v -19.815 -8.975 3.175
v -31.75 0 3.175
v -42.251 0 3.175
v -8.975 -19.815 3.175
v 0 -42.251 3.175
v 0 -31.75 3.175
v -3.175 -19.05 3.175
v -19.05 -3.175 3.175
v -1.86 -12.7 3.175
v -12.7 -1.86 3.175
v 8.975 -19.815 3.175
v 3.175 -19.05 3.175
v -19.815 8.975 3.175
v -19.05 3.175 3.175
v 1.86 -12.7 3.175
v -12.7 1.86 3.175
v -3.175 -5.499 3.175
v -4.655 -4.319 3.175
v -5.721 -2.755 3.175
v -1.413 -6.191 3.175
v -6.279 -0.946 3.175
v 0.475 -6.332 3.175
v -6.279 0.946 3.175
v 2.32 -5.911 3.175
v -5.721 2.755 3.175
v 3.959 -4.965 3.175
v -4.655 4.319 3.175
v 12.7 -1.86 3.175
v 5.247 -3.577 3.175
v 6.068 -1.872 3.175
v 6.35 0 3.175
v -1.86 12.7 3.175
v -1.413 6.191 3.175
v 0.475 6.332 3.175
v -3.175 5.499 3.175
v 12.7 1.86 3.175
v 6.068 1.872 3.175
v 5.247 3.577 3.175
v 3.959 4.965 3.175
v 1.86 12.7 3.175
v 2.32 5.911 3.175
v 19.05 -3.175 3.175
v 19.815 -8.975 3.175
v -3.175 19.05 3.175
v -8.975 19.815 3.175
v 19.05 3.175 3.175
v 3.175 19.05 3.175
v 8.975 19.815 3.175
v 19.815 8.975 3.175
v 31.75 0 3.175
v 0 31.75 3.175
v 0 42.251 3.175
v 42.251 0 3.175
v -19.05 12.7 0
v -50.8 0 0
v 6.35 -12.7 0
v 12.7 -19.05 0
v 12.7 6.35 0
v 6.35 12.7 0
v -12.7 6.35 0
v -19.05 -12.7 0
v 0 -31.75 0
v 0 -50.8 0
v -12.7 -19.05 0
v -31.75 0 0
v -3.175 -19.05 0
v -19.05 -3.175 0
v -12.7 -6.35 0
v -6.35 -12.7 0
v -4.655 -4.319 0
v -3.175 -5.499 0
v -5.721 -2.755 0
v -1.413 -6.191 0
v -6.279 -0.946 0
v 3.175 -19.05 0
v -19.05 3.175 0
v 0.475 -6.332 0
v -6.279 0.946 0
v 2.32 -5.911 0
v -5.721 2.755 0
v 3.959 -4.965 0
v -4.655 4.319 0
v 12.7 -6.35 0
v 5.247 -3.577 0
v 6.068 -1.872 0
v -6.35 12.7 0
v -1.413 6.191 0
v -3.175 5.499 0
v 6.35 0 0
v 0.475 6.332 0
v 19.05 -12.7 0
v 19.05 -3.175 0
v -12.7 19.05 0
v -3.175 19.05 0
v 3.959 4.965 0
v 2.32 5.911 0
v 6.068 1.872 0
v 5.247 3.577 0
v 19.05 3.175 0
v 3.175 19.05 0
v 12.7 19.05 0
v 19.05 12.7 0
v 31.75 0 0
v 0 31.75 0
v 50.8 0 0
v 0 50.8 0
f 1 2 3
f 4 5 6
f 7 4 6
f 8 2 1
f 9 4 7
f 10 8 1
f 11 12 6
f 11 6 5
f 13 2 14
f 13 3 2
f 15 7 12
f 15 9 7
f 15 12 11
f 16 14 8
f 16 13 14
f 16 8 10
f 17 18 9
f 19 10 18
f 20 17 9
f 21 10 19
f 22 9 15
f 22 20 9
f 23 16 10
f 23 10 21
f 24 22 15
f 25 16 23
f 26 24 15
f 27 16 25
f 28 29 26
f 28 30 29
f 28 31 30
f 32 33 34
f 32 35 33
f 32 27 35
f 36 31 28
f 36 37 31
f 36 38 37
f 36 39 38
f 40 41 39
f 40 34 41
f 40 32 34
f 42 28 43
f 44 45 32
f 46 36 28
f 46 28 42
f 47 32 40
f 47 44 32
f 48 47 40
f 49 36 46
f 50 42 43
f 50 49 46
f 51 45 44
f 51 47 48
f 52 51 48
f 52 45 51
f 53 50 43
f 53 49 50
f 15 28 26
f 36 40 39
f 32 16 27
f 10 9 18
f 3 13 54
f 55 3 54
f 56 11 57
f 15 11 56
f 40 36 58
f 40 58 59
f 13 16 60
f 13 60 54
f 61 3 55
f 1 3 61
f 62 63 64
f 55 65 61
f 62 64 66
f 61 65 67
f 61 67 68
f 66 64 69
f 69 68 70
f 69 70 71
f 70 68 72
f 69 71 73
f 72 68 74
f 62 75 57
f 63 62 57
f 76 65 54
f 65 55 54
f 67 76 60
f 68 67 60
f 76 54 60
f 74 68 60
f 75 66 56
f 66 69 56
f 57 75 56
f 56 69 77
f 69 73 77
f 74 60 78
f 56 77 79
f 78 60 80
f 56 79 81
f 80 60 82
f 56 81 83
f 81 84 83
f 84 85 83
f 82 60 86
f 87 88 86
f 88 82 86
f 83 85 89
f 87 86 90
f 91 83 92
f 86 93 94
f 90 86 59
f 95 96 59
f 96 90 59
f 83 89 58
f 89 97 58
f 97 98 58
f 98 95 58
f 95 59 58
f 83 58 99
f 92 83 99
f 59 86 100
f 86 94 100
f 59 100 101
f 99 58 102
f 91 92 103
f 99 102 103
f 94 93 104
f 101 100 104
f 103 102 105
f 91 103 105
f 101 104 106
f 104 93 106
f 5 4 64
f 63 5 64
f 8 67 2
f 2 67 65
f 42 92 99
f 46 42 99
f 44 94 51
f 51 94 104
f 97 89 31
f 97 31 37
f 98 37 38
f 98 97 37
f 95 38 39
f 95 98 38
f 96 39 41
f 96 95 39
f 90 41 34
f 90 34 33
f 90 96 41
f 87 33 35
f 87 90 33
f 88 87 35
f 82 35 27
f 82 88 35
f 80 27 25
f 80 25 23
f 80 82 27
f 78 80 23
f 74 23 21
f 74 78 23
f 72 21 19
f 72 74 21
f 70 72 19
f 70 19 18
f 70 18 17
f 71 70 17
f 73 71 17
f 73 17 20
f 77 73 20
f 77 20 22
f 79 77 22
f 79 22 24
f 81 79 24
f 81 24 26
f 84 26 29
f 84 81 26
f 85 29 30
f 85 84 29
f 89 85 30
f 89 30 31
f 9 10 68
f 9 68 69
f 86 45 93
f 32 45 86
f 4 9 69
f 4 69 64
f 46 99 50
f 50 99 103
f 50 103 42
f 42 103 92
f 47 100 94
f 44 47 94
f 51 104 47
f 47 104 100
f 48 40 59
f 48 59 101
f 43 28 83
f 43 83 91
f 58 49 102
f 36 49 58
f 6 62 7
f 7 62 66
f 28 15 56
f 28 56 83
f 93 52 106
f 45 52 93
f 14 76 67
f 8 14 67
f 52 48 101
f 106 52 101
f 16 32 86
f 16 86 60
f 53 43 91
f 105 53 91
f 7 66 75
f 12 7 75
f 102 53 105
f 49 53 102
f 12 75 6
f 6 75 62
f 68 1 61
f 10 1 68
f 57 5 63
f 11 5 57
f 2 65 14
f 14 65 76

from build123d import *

# Parameters (mm, degrees)
F0_R     = 6.35
F1_DEPTH = 3.175
F2_SIZE  = 3.17499


# Not quite as in the source:
# - a fillet or chamfer is up to 0.001 mm smaller than in the source, because OpenCascade refuses the exact size


with BuildPart() as f1:
    # F0 (on Top) → F1 (new body)
    with BuildSketch(Plane.XY):
        Polygon((6.35, -12.6999929847), (-6.35, -12.6999929847), (-12.6999929847, -19.0499859695), (0, -50.7999929847), (12.6999929847, -19.0499859695), align=None)
        Polygon((-3.175, -19.0499929847), (3.175, -19.0499929847), (0, -31.7499929847), align=None, mode=Mode.SUBTRACT)
        Polygon((19.0499859695, 12.6999929847), (12.6999929847, 6.35), (12.6999929847, -6.35), (19.0499859695, -12.6999929847), (50.7999929847, 0), align=None)
        Polygon((19.0499929847, -3.175), (19.0499929847, 3.175), (31.7499929847, 0), align=None, mode=Mode.SUBTRACT)
        Polygon((-6.35, 12.6999929847), (-12.6999929847, 6.35), (-12.6999929847, -6.35), (-6.35, -12.6999929847), (6.35, -12.6999929847), (12.6999929847, -6.35), (12.6999929847, 6.35), (6.35, 12.6999929847), align=None)
        Circle(F0_R, mode=Mode.SUBTRACT)
        Polygon((-12.6999929847, -6.35), (-12.6999929847, 6.35), (-19.0499859695, 12.6999929847), (-50.7999929847, 0), (-19.0499859695, -12.6999929847), align=None)
        Polygon((-19.0499929847, 3.175), (-19.0499929847, -3.175), (-31.7499929847, 0), align=None, mode=Mode.SUBTRACT)
        Polygon((-12.6999929847, 19.0499859695), (-6.35, 12.6999929847), (6.35, 12.6999929847), (12.6999929847, 19.0499859695), (0, 50.7999929847), align=None)
        Polygon((3.175, 19.0499929847), (-3.175, 19.0499929847), (0, 31.7499929847), align=None, mode=Mode.SUBTRACT)
    extrude(amount=F1_DEPTH)

    # F2 (size 3.175 in the source; OpenCascade refuses exactly that, so slightly less here)
    f2_edges = [f1.edges().sort_by_distance(p)[0] for p in [
        (6.349996, -34.924989, 3.175),
        (-6.349996, -34.924989, 3.175),
        (-9.524996, -15.874989, 3.175),
        (9.524996, -15.874989, 3.175),
        (34.924989, -6.349996, 3.175),
        (15.874989, -9.524996, 3.175),
        (34.924989, 6.349996, 3.175),
        (15.874989, 9.524996, 3.175),
        (9.524996, -9.524996, 3.175),
        (-9.524996, -9.524996, 3.175),
        (-15.874989, -9.524996, 3.175),
        (-34.924989, -6.349996, 3.175),
        (-34.924989, 6.349996, 3.175),
        (-15.874989, 9.524996, 3.175),
        (-9.524996, 9.524996, 3.175),
        (9.524996, 9.524996, 3.175),
        (-9.524996, 15.874989, 3.175),
        (-6.349996, 34.924989, 3.175),
        (6.349996, 34.924989, 3.175),
        (9.524996, 15.874989, 3.175),
    ]]
    chamfer(f2_edges, length=F2_SIZE)


solid = f1.part
